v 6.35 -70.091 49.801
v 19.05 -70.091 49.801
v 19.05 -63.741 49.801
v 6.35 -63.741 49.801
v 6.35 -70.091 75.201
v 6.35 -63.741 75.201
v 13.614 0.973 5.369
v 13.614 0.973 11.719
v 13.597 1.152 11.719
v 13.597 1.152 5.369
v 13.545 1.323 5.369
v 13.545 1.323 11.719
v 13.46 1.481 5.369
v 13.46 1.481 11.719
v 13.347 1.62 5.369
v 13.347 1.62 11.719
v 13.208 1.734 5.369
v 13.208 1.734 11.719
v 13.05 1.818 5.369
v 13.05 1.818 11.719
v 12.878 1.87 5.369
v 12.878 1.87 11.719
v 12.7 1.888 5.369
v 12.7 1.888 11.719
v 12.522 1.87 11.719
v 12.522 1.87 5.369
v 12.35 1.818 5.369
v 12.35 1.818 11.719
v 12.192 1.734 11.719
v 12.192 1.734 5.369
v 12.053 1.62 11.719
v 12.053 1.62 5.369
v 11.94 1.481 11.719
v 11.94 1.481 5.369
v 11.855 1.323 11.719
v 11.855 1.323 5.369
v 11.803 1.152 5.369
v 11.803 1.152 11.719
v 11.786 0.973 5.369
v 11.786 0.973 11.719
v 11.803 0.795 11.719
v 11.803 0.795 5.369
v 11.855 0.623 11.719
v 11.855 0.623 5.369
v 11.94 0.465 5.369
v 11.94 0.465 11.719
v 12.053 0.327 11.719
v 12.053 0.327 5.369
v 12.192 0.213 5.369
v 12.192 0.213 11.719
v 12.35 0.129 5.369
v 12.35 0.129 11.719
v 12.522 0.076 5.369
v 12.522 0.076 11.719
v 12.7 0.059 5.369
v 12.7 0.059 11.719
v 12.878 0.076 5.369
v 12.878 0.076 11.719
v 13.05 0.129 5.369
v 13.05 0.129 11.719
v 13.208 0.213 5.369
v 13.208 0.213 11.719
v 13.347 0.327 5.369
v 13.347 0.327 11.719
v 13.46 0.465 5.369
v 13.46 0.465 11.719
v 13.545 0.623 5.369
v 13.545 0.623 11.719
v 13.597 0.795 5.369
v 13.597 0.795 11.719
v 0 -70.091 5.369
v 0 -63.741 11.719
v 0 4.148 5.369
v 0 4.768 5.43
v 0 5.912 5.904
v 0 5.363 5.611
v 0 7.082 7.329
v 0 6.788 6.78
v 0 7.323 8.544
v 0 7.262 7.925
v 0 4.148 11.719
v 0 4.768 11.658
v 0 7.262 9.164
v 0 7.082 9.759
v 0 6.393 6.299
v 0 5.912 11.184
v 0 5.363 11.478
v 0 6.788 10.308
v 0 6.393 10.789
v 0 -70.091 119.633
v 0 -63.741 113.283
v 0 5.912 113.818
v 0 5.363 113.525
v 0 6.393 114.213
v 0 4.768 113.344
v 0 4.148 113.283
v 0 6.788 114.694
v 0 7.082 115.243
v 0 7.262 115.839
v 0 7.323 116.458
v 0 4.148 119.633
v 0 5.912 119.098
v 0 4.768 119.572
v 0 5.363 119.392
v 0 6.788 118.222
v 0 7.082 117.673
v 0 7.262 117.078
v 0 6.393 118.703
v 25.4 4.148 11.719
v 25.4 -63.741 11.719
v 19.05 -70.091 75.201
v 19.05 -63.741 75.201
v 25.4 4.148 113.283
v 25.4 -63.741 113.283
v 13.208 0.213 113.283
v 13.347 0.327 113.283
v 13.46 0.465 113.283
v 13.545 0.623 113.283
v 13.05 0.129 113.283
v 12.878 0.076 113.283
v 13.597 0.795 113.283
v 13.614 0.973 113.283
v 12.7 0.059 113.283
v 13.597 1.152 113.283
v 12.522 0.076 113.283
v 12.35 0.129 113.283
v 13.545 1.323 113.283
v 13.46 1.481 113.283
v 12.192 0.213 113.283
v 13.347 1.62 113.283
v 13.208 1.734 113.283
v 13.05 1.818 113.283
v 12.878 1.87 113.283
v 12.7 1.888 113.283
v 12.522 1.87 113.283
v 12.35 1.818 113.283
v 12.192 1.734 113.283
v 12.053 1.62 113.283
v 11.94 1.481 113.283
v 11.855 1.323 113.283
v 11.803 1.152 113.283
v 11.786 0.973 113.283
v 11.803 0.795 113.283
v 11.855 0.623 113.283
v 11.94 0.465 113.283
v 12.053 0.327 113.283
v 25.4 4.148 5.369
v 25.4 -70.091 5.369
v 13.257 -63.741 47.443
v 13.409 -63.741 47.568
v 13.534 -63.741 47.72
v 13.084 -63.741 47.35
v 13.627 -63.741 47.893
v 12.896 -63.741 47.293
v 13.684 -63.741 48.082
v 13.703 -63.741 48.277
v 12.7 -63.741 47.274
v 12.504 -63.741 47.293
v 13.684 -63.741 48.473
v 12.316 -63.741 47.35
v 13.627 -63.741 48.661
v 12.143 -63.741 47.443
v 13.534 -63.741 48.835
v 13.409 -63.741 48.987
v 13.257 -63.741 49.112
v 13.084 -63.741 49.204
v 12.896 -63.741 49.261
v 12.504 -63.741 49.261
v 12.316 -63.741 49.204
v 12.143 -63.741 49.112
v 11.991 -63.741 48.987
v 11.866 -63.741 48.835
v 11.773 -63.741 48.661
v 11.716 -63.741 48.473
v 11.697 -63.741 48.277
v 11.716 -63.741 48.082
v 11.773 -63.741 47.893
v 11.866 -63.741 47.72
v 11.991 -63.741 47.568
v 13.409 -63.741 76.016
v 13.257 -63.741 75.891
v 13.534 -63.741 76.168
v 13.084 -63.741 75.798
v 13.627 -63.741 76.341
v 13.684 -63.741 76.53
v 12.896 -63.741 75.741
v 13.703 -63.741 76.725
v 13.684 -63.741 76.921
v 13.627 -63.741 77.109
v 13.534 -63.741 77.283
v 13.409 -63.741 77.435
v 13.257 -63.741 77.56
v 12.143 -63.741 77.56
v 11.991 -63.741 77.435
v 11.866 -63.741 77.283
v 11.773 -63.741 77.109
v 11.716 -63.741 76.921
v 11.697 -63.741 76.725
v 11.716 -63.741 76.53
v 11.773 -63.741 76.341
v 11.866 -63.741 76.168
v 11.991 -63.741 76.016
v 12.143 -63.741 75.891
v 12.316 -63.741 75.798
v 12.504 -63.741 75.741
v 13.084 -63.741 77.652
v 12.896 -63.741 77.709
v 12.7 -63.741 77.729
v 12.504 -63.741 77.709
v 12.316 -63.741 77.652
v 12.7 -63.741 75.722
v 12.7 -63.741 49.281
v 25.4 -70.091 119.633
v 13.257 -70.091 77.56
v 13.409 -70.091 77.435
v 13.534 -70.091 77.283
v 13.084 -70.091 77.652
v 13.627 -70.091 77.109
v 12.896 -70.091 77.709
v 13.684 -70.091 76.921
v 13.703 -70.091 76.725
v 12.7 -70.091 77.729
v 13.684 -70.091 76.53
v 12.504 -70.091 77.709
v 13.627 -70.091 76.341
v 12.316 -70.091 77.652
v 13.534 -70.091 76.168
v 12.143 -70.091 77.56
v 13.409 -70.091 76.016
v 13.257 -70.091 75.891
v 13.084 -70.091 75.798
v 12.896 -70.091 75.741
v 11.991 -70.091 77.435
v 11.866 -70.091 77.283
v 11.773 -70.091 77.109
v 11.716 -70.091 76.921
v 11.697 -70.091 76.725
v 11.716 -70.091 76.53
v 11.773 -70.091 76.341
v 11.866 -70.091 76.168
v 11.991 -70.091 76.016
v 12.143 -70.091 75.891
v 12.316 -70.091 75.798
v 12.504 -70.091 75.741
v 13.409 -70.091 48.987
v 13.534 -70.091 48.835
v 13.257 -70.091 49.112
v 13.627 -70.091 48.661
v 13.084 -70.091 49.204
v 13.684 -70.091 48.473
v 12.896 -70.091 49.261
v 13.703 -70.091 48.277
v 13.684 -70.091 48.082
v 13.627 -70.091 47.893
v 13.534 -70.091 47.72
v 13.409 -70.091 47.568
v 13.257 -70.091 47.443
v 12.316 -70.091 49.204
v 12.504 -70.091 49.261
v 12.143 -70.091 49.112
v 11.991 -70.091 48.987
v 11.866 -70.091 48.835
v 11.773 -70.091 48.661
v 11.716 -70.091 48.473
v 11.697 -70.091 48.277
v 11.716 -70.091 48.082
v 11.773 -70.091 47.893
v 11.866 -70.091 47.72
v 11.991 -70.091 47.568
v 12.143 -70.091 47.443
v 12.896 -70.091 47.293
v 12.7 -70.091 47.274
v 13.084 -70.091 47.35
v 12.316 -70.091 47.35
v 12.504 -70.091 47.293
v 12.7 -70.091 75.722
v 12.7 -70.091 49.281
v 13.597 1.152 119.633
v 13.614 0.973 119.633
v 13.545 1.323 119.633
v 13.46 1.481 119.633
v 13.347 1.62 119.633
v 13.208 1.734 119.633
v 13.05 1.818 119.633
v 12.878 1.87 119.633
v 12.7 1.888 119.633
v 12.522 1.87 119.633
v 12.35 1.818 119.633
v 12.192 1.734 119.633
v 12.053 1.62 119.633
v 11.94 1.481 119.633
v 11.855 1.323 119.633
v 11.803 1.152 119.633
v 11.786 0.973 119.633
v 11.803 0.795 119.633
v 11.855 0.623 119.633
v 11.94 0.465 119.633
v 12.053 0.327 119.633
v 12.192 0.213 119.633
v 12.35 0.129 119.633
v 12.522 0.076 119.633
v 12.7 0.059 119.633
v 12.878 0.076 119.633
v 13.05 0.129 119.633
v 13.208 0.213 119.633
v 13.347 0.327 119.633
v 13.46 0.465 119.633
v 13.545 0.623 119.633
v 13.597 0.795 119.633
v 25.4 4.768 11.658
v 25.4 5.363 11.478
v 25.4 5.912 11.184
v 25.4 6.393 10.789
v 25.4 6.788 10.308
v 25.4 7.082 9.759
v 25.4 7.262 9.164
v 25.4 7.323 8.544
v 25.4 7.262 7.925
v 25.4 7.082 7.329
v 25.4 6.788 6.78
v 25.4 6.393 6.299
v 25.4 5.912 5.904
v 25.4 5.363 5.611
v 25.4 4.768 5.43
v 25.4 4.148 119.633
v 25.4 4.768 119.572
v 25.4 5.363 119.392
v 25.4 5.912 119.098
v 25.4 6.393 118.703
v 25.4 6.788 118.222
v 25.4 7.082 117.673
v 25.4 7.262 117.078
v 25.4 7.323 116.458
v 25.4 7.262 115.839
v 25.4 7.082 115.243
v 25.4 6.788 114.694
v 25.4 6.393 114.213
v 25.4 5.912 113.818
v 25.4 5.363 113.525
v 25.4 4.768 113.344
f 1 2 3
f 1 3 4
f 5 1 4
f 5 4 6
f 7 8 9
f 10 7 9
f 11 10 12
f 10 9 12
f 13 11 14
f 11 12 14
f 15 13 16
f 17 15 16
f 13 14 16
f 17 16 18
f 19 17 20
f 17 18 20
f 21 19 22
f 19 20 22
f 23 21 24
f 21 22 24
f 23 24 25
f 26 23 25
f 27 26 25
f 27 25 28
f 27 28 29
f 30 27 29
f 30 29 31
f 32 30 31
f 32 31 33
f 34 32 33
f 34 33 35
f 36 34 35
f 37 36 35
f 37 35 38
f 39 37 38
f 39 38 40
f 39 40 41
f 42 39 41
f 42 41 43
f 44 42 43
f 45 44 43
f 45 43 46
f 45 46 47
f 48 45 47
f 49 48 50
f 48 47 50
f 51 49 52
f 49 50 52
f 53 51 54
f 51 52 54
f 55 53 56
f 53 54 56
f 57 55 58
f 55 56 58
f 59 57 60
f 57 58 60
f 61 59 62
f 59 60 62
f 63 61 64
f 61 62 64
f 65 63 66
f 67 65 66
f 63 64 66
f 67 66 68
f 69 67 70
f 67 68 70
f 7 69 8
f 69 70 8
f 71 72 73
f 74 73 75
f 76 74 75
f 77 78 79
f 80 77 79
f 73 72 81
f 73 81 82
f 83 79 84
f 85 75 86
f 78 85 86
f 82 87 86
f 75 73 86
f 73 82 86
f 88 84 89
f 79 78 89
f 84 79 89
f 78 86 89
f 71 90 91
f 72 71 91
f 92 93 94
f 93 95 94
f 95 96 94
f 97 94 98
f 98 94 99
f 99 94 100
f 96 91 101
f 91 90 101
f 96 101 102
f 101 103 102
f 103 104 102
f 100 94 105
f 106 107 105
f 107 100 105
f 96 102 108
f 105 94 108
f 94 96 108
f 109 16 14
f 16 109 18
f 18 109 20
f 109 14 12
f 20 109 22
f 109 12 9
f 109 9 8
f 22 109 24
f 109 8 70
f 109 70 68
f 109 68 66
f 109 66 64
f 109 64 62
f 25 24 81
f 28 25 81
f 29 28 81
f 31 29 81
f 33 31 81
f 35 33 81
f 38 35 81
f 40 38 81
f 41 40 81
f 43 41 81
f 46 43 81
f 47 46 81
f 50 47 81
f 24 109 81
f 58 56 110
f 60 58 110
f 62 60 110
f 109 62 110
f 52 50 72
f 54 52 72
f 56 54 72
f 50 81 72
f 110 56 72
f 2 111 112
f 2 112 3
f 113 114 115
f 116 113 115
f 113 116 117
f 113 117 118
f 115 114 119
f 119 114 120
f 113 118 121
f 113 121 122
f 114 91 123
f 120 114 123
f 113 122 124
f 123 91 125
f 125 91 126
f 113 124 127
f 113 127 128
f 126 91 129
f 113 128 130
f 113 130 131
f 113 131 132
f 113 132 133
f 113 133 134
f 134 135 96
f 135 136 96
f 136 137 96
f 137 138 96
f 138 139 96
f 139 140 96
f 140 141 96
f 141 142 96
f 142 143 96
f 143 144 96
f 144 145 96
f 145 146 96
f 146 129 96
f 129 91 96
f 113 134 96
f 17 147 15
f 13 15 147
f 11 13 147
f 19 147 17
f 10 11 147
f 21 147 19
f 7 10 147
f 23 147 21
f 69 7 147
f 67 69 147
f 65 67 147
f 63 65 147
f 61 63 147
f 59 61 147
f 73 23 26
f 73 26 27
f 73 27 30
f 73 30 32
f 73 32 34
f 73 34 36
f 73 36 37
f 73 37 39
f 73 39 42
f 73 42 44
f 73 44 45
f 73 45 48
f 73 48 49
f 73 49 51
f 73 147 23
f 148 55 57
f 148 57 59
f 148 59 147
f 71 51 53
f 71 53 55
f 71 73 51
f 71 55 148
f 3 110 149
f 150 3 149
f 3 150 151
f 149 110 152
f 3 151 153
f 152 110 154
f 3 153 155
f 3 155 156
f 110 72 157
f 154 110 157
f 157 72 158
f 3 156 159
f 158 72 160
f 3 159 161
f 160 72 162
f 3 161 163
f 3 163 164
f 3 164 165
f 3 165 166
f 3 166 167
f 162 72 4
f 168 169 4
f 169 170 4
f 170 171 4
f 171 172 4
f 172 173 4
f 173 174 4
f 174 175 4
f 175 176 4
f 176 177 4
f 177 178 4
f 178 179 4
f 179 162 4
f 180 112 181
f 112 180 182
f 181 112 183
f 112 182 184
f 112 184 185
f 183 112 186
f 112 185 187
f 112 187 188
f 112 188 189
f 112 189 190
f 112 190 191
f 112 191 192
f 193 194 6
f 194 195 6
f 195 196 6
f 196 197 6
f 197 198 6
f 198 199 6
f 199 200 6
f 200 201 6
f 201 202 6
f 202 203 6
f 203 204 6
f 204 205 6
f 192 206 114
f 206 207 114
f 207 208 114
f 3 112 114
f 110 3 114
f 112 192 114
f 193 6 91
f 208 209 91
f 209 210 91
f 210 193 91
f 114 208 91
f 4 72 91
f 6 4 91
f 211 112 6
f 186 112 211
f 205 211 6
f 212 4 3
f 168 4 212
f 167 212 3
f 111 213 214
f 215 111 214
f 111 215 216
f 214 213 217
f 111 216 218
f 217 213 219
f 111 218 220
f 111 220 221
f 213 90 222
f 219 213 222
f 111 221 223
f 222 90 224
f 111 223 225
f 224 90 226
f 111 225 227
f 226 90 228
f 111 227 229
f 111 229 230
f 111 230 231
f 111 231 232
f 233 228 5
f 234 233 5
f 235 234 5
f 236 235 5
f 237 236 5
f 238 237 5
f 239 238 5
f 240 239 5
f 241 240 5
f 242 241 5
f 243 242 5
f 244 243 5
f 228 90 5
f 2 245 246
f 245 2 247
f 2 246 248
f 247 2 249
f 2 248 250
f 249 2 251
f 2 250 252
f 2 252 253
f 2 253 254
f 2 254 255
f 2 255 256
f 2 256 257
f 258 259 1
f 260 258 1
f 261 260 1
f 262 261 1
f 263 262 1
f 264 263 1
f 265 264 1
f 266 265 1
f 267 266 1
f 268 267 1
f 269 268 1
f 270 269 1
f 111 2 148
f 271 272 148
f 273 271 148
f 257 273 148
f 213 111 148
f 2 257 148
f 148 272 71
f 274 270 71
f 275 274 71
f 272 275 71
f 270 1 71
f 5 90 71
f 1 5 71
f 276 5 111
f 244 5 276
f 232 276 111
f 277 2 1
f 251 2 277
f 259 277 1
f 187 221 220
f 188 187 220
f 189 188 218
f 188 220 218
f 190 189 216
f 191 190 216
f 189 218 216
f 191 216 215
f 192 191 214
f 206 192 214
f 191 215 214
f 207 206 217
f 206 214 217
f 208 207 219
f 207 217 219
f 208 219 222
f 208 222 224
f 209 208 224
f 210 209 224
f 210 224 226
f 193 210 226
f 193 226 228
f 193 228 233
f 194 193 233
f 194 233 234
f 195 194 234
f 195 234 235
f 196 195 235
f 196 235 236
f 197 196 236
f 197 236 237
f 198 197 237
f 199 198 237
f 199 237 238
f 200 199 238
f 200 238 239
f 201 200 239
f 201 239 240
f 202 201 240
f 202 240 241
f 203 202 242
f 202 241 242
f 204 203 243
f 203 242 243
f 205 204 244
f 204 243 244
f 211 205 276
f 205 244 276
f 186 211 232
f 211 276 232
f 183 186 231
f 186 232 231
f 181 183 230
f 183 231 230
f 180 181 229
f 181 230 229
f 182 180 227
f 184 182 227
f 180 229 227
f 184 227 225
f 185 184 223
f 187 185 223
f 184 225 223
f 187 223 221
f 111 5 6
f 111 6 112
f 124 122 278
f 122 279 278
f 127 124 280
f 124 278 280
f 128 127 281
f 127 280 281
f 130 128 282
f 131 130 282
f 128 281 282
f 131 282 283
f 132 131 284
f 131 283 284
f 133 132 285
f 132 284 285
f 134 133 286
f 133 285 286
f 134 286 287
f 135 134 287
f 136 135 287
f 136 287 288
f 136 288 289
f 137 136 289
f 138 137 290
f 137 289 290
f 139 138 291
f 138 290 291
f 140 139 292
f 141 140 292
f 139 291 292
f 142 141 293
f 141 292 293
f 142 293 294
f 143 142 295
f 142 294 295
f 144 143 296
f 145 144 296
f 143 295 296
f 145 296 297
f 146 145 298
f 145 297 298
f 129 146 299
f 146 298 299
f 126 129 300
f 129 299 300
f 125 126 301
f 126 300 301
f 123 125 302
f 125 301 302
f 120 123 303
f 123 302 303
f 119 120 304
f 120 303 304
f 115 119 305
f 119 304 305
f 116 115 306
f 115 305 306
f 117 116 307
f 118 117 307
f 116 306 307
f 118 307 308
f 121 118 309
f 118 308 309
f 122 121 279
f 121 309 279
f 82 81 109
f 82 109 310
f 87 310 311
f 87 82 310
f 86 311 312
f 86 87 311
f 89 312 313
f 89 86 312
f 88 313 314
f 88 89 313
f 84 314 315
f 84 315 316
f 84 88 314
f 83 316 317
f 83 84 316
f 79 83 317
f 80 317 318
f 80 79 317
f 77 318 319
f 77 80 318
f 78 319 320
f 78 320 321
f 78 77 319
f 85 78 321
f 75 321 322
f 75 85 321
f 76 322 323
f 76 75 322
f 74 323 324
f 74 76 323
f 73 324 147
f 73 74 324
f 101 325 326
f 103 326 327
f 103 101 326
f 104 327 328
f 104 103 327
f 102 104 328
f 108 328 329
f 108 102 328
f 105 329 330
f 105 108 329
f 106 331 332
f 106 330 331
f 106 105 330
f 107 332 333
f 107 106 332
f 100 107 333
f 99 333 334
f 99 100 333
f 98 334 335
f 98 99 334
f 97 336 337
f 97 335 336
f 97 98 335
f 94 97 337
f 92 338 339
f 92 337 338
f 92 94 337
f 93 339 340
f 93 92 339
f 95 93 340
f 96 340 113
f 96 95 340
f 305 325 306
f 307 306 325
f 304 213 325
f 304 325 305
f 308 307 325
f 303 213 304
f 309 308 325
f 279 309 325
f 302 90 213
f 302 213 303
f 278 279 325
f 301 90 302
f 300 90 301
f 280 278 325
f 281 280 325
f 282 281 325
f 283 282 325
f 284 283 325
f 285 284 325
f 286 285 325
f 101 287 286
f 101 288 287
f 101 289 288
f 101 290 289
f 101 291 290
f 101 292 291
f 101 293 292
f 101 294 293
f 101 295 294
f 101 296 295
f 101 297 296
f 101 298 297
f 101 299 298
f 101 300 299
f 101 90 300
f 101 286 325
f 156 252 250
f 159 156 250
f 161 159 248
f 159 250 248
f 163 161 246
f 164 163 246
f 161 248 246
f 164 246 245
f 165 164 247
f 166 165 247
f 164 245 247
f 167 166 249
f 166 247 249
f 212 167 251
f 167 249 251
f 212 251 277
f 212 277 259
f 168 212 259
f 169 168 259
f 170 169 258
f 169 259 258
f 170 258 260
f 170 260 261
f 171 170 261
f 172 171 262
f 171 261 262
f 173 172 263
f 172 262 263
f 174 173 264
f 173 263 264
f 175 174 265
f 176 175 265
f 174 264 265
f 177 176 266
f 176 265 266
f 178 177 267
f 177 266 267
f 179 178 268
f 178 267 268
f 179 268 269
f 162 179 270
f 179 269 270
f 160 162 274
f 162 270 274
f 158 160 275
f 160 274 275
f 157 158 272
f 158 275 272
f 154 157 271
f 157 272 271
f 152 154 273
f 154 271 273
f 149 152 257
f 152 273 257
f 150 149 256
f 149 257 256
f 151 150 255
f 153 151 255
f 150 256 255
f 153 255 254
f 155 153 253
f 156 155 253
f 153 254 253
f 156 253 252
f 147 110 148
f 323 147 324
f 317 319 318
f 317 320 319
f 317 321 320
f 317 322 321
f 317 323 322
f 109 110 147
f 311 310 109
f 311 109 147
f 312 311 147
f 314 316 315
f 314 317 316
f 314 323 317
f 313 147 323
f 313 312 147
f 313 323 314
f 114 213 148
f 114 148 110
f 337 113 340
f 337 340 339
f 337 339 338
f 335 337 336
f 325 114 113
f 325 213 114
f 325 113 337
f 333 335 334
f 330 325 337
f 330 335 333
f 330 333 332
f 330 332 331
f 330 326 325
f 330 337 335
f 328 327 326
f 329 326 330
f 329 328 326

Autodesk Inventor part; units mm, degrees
ref_plane "YZ Plane" through (0, 0, 0) normal (1, 0, 0) x (0, 1, 0)
ref_plane "XZ Plane" through (0, 0, 0) normal (0, 1, 0) x (-1, 0, 0)
ref_plane "XY Plane" through (0, 0, 0) normal (0, 0, 1) x (1, 0, 0)
sketch "Sketch1" plane through (0, 0, 0) normal (1, 0, 0) x (0, 1, 0)
  point P0 (0, 0)
sketch "Sketch2" plane through (0, 0, 0) normal (1, 0, 0) x (0, 1, 0)
  line L0 (7.3233, 8.5443) -> (7.3233, 8.5443)
  line L1 (4.1483, 5.3693) -> (-70.0914, 5.3693)
  line L2 (4.1483, 11.7193) -> (-63.7414, 11.7193)
  line L3 (-70.0914, 60.6498) -> (-70.0914, 5.3693)
  line L4 (7.3233, 103.7583) -> (7.3233, 103.7583)
  line L5 (-63.7414, 62.4452) -> (-63.7414, 11.7193)
  arc A0 (7.3233, 8.5443) -> (4.1483, 11.7193) centre (4.1483, 8.5443) ccw
  arc A1 (4.1483, 5.3693) -> (7.3233, 8.5443) centre (4.1483, 8.5443) ccw
  line L6 (-70.0914, 60.6498) -> (-70.0914, 119.6333)
  line L7 (-70.0914, 119.6333) -> (4.1483, 119.6333)
  line L8 (-63.7414, 62.4452) -> (-63.7414, 113.2833)
  line L9 (-63.7414, 113.2833) -> (13.8631, 113.2833)
  line L10 (4.1483, 119.6333) -> (4.1483, 119.6333)
  line L11 (7.3233, 116.4583) -> (7.3233, 116.4583)
  arc A2 (7.3233, 116.4583) -> (4.1483, 119.6333) centre (4.1483, 116.4583) ccw
  arc A3 (4.1483, 113.2833) -> (7.3233, 116.4583) centre (4.1483, 116.4583) ccw
  point P0 (0, 0)
  point P1 (7.3233, 11.7193)
  point P2 (7.3233, 5.3693)
  point P3 (7.3233, 106.9333)
  point P4 (7.3233, 100.5833)
  point P5 (7.3233, 8.5443)
  point P6 (7.3233, 119.6333)
  point P7 (4.1483, 113.2833)
  point P8 (4.1483, 119.6333)
  dimension "d0" = 6.35
  dimension "d35" = 3.175
  dimension "d36" = 3.175
  dimension "d42" = 6.35
  dimension "d43" = 6.35
extrude "Extrusion1" add sketch "Sketch2" along normal blind 25.4
sketch "Sketch4" plane through (0, -70.0914, 5.3693) normal (0, -1, 0) x (1, 0, 0)
  line L0 (0, 0) -> (25.4, 0) projected
  line L1 (25.4, 114.264) -> (25.4, 0) projected
  line L2 (25.4, 57.132) -> (12.7, 57.132)
  line L3 (19.05, 44.432) -> (6.35, 44.432)
  line L4 (6.35, 44.432) -> (6.35, 69.832)
  line L5 (6.35, 69.832) -> (19.05, 69.832)
  line L6 (19.05, 69.832) -> (19.05, 44.432)
  line L7 (19.05, 44.432) -> (6.35, 69.832) construction
  line L8 (6.35, 44.432) -> (19.05, 69.832) construction
  point P0 (0, -5.3693)
  point P1 (25.4, 101.6762)
  dimension "d48" = 12.7
  dimension "d49" = 25.4
sketch "Sketch6" plane through (0, -70.0914, 119.6333) normal (0, 0, 1) x (1, 0, 0)
  line L0 (0, 77.4147) -> (25.4, 77.4147) projected
  line L1 (0, 77.4147) -> (25.4, 77.4147) projected
  circle A0 centre (12.7, 71.0647) radius 0.9144
  point P0 (0, 70.0914)
  dimension "d45" = 1.8288
extrude "Extrusion6" cut sketch "Sketch6" against normal through all
extrude "Extrusion7" cut sketch "Sketch4" against normal through all
sketch "Sketch7" plane through (0, -70.0914, 5.3693) normal (0, -1, 0) x (1, 0, 0)
  line L0 (19.05, 69.832) -> (6.35, 69.832) projected
  line L1 (6.35, 44.432) -> (19.05, 44.432) projected
  circle A0 centre (12.7, 71.356) radius 1.0033
  circle A1 centre (12.7, 42.908) radius 1.0033
  point P0 (0, -5.3693)
  dimension "d55" = 2.0066
extrude "Extrusion8" cut sketch "Sketch7" against normal through all
properties part number "1st Servo Holder"
